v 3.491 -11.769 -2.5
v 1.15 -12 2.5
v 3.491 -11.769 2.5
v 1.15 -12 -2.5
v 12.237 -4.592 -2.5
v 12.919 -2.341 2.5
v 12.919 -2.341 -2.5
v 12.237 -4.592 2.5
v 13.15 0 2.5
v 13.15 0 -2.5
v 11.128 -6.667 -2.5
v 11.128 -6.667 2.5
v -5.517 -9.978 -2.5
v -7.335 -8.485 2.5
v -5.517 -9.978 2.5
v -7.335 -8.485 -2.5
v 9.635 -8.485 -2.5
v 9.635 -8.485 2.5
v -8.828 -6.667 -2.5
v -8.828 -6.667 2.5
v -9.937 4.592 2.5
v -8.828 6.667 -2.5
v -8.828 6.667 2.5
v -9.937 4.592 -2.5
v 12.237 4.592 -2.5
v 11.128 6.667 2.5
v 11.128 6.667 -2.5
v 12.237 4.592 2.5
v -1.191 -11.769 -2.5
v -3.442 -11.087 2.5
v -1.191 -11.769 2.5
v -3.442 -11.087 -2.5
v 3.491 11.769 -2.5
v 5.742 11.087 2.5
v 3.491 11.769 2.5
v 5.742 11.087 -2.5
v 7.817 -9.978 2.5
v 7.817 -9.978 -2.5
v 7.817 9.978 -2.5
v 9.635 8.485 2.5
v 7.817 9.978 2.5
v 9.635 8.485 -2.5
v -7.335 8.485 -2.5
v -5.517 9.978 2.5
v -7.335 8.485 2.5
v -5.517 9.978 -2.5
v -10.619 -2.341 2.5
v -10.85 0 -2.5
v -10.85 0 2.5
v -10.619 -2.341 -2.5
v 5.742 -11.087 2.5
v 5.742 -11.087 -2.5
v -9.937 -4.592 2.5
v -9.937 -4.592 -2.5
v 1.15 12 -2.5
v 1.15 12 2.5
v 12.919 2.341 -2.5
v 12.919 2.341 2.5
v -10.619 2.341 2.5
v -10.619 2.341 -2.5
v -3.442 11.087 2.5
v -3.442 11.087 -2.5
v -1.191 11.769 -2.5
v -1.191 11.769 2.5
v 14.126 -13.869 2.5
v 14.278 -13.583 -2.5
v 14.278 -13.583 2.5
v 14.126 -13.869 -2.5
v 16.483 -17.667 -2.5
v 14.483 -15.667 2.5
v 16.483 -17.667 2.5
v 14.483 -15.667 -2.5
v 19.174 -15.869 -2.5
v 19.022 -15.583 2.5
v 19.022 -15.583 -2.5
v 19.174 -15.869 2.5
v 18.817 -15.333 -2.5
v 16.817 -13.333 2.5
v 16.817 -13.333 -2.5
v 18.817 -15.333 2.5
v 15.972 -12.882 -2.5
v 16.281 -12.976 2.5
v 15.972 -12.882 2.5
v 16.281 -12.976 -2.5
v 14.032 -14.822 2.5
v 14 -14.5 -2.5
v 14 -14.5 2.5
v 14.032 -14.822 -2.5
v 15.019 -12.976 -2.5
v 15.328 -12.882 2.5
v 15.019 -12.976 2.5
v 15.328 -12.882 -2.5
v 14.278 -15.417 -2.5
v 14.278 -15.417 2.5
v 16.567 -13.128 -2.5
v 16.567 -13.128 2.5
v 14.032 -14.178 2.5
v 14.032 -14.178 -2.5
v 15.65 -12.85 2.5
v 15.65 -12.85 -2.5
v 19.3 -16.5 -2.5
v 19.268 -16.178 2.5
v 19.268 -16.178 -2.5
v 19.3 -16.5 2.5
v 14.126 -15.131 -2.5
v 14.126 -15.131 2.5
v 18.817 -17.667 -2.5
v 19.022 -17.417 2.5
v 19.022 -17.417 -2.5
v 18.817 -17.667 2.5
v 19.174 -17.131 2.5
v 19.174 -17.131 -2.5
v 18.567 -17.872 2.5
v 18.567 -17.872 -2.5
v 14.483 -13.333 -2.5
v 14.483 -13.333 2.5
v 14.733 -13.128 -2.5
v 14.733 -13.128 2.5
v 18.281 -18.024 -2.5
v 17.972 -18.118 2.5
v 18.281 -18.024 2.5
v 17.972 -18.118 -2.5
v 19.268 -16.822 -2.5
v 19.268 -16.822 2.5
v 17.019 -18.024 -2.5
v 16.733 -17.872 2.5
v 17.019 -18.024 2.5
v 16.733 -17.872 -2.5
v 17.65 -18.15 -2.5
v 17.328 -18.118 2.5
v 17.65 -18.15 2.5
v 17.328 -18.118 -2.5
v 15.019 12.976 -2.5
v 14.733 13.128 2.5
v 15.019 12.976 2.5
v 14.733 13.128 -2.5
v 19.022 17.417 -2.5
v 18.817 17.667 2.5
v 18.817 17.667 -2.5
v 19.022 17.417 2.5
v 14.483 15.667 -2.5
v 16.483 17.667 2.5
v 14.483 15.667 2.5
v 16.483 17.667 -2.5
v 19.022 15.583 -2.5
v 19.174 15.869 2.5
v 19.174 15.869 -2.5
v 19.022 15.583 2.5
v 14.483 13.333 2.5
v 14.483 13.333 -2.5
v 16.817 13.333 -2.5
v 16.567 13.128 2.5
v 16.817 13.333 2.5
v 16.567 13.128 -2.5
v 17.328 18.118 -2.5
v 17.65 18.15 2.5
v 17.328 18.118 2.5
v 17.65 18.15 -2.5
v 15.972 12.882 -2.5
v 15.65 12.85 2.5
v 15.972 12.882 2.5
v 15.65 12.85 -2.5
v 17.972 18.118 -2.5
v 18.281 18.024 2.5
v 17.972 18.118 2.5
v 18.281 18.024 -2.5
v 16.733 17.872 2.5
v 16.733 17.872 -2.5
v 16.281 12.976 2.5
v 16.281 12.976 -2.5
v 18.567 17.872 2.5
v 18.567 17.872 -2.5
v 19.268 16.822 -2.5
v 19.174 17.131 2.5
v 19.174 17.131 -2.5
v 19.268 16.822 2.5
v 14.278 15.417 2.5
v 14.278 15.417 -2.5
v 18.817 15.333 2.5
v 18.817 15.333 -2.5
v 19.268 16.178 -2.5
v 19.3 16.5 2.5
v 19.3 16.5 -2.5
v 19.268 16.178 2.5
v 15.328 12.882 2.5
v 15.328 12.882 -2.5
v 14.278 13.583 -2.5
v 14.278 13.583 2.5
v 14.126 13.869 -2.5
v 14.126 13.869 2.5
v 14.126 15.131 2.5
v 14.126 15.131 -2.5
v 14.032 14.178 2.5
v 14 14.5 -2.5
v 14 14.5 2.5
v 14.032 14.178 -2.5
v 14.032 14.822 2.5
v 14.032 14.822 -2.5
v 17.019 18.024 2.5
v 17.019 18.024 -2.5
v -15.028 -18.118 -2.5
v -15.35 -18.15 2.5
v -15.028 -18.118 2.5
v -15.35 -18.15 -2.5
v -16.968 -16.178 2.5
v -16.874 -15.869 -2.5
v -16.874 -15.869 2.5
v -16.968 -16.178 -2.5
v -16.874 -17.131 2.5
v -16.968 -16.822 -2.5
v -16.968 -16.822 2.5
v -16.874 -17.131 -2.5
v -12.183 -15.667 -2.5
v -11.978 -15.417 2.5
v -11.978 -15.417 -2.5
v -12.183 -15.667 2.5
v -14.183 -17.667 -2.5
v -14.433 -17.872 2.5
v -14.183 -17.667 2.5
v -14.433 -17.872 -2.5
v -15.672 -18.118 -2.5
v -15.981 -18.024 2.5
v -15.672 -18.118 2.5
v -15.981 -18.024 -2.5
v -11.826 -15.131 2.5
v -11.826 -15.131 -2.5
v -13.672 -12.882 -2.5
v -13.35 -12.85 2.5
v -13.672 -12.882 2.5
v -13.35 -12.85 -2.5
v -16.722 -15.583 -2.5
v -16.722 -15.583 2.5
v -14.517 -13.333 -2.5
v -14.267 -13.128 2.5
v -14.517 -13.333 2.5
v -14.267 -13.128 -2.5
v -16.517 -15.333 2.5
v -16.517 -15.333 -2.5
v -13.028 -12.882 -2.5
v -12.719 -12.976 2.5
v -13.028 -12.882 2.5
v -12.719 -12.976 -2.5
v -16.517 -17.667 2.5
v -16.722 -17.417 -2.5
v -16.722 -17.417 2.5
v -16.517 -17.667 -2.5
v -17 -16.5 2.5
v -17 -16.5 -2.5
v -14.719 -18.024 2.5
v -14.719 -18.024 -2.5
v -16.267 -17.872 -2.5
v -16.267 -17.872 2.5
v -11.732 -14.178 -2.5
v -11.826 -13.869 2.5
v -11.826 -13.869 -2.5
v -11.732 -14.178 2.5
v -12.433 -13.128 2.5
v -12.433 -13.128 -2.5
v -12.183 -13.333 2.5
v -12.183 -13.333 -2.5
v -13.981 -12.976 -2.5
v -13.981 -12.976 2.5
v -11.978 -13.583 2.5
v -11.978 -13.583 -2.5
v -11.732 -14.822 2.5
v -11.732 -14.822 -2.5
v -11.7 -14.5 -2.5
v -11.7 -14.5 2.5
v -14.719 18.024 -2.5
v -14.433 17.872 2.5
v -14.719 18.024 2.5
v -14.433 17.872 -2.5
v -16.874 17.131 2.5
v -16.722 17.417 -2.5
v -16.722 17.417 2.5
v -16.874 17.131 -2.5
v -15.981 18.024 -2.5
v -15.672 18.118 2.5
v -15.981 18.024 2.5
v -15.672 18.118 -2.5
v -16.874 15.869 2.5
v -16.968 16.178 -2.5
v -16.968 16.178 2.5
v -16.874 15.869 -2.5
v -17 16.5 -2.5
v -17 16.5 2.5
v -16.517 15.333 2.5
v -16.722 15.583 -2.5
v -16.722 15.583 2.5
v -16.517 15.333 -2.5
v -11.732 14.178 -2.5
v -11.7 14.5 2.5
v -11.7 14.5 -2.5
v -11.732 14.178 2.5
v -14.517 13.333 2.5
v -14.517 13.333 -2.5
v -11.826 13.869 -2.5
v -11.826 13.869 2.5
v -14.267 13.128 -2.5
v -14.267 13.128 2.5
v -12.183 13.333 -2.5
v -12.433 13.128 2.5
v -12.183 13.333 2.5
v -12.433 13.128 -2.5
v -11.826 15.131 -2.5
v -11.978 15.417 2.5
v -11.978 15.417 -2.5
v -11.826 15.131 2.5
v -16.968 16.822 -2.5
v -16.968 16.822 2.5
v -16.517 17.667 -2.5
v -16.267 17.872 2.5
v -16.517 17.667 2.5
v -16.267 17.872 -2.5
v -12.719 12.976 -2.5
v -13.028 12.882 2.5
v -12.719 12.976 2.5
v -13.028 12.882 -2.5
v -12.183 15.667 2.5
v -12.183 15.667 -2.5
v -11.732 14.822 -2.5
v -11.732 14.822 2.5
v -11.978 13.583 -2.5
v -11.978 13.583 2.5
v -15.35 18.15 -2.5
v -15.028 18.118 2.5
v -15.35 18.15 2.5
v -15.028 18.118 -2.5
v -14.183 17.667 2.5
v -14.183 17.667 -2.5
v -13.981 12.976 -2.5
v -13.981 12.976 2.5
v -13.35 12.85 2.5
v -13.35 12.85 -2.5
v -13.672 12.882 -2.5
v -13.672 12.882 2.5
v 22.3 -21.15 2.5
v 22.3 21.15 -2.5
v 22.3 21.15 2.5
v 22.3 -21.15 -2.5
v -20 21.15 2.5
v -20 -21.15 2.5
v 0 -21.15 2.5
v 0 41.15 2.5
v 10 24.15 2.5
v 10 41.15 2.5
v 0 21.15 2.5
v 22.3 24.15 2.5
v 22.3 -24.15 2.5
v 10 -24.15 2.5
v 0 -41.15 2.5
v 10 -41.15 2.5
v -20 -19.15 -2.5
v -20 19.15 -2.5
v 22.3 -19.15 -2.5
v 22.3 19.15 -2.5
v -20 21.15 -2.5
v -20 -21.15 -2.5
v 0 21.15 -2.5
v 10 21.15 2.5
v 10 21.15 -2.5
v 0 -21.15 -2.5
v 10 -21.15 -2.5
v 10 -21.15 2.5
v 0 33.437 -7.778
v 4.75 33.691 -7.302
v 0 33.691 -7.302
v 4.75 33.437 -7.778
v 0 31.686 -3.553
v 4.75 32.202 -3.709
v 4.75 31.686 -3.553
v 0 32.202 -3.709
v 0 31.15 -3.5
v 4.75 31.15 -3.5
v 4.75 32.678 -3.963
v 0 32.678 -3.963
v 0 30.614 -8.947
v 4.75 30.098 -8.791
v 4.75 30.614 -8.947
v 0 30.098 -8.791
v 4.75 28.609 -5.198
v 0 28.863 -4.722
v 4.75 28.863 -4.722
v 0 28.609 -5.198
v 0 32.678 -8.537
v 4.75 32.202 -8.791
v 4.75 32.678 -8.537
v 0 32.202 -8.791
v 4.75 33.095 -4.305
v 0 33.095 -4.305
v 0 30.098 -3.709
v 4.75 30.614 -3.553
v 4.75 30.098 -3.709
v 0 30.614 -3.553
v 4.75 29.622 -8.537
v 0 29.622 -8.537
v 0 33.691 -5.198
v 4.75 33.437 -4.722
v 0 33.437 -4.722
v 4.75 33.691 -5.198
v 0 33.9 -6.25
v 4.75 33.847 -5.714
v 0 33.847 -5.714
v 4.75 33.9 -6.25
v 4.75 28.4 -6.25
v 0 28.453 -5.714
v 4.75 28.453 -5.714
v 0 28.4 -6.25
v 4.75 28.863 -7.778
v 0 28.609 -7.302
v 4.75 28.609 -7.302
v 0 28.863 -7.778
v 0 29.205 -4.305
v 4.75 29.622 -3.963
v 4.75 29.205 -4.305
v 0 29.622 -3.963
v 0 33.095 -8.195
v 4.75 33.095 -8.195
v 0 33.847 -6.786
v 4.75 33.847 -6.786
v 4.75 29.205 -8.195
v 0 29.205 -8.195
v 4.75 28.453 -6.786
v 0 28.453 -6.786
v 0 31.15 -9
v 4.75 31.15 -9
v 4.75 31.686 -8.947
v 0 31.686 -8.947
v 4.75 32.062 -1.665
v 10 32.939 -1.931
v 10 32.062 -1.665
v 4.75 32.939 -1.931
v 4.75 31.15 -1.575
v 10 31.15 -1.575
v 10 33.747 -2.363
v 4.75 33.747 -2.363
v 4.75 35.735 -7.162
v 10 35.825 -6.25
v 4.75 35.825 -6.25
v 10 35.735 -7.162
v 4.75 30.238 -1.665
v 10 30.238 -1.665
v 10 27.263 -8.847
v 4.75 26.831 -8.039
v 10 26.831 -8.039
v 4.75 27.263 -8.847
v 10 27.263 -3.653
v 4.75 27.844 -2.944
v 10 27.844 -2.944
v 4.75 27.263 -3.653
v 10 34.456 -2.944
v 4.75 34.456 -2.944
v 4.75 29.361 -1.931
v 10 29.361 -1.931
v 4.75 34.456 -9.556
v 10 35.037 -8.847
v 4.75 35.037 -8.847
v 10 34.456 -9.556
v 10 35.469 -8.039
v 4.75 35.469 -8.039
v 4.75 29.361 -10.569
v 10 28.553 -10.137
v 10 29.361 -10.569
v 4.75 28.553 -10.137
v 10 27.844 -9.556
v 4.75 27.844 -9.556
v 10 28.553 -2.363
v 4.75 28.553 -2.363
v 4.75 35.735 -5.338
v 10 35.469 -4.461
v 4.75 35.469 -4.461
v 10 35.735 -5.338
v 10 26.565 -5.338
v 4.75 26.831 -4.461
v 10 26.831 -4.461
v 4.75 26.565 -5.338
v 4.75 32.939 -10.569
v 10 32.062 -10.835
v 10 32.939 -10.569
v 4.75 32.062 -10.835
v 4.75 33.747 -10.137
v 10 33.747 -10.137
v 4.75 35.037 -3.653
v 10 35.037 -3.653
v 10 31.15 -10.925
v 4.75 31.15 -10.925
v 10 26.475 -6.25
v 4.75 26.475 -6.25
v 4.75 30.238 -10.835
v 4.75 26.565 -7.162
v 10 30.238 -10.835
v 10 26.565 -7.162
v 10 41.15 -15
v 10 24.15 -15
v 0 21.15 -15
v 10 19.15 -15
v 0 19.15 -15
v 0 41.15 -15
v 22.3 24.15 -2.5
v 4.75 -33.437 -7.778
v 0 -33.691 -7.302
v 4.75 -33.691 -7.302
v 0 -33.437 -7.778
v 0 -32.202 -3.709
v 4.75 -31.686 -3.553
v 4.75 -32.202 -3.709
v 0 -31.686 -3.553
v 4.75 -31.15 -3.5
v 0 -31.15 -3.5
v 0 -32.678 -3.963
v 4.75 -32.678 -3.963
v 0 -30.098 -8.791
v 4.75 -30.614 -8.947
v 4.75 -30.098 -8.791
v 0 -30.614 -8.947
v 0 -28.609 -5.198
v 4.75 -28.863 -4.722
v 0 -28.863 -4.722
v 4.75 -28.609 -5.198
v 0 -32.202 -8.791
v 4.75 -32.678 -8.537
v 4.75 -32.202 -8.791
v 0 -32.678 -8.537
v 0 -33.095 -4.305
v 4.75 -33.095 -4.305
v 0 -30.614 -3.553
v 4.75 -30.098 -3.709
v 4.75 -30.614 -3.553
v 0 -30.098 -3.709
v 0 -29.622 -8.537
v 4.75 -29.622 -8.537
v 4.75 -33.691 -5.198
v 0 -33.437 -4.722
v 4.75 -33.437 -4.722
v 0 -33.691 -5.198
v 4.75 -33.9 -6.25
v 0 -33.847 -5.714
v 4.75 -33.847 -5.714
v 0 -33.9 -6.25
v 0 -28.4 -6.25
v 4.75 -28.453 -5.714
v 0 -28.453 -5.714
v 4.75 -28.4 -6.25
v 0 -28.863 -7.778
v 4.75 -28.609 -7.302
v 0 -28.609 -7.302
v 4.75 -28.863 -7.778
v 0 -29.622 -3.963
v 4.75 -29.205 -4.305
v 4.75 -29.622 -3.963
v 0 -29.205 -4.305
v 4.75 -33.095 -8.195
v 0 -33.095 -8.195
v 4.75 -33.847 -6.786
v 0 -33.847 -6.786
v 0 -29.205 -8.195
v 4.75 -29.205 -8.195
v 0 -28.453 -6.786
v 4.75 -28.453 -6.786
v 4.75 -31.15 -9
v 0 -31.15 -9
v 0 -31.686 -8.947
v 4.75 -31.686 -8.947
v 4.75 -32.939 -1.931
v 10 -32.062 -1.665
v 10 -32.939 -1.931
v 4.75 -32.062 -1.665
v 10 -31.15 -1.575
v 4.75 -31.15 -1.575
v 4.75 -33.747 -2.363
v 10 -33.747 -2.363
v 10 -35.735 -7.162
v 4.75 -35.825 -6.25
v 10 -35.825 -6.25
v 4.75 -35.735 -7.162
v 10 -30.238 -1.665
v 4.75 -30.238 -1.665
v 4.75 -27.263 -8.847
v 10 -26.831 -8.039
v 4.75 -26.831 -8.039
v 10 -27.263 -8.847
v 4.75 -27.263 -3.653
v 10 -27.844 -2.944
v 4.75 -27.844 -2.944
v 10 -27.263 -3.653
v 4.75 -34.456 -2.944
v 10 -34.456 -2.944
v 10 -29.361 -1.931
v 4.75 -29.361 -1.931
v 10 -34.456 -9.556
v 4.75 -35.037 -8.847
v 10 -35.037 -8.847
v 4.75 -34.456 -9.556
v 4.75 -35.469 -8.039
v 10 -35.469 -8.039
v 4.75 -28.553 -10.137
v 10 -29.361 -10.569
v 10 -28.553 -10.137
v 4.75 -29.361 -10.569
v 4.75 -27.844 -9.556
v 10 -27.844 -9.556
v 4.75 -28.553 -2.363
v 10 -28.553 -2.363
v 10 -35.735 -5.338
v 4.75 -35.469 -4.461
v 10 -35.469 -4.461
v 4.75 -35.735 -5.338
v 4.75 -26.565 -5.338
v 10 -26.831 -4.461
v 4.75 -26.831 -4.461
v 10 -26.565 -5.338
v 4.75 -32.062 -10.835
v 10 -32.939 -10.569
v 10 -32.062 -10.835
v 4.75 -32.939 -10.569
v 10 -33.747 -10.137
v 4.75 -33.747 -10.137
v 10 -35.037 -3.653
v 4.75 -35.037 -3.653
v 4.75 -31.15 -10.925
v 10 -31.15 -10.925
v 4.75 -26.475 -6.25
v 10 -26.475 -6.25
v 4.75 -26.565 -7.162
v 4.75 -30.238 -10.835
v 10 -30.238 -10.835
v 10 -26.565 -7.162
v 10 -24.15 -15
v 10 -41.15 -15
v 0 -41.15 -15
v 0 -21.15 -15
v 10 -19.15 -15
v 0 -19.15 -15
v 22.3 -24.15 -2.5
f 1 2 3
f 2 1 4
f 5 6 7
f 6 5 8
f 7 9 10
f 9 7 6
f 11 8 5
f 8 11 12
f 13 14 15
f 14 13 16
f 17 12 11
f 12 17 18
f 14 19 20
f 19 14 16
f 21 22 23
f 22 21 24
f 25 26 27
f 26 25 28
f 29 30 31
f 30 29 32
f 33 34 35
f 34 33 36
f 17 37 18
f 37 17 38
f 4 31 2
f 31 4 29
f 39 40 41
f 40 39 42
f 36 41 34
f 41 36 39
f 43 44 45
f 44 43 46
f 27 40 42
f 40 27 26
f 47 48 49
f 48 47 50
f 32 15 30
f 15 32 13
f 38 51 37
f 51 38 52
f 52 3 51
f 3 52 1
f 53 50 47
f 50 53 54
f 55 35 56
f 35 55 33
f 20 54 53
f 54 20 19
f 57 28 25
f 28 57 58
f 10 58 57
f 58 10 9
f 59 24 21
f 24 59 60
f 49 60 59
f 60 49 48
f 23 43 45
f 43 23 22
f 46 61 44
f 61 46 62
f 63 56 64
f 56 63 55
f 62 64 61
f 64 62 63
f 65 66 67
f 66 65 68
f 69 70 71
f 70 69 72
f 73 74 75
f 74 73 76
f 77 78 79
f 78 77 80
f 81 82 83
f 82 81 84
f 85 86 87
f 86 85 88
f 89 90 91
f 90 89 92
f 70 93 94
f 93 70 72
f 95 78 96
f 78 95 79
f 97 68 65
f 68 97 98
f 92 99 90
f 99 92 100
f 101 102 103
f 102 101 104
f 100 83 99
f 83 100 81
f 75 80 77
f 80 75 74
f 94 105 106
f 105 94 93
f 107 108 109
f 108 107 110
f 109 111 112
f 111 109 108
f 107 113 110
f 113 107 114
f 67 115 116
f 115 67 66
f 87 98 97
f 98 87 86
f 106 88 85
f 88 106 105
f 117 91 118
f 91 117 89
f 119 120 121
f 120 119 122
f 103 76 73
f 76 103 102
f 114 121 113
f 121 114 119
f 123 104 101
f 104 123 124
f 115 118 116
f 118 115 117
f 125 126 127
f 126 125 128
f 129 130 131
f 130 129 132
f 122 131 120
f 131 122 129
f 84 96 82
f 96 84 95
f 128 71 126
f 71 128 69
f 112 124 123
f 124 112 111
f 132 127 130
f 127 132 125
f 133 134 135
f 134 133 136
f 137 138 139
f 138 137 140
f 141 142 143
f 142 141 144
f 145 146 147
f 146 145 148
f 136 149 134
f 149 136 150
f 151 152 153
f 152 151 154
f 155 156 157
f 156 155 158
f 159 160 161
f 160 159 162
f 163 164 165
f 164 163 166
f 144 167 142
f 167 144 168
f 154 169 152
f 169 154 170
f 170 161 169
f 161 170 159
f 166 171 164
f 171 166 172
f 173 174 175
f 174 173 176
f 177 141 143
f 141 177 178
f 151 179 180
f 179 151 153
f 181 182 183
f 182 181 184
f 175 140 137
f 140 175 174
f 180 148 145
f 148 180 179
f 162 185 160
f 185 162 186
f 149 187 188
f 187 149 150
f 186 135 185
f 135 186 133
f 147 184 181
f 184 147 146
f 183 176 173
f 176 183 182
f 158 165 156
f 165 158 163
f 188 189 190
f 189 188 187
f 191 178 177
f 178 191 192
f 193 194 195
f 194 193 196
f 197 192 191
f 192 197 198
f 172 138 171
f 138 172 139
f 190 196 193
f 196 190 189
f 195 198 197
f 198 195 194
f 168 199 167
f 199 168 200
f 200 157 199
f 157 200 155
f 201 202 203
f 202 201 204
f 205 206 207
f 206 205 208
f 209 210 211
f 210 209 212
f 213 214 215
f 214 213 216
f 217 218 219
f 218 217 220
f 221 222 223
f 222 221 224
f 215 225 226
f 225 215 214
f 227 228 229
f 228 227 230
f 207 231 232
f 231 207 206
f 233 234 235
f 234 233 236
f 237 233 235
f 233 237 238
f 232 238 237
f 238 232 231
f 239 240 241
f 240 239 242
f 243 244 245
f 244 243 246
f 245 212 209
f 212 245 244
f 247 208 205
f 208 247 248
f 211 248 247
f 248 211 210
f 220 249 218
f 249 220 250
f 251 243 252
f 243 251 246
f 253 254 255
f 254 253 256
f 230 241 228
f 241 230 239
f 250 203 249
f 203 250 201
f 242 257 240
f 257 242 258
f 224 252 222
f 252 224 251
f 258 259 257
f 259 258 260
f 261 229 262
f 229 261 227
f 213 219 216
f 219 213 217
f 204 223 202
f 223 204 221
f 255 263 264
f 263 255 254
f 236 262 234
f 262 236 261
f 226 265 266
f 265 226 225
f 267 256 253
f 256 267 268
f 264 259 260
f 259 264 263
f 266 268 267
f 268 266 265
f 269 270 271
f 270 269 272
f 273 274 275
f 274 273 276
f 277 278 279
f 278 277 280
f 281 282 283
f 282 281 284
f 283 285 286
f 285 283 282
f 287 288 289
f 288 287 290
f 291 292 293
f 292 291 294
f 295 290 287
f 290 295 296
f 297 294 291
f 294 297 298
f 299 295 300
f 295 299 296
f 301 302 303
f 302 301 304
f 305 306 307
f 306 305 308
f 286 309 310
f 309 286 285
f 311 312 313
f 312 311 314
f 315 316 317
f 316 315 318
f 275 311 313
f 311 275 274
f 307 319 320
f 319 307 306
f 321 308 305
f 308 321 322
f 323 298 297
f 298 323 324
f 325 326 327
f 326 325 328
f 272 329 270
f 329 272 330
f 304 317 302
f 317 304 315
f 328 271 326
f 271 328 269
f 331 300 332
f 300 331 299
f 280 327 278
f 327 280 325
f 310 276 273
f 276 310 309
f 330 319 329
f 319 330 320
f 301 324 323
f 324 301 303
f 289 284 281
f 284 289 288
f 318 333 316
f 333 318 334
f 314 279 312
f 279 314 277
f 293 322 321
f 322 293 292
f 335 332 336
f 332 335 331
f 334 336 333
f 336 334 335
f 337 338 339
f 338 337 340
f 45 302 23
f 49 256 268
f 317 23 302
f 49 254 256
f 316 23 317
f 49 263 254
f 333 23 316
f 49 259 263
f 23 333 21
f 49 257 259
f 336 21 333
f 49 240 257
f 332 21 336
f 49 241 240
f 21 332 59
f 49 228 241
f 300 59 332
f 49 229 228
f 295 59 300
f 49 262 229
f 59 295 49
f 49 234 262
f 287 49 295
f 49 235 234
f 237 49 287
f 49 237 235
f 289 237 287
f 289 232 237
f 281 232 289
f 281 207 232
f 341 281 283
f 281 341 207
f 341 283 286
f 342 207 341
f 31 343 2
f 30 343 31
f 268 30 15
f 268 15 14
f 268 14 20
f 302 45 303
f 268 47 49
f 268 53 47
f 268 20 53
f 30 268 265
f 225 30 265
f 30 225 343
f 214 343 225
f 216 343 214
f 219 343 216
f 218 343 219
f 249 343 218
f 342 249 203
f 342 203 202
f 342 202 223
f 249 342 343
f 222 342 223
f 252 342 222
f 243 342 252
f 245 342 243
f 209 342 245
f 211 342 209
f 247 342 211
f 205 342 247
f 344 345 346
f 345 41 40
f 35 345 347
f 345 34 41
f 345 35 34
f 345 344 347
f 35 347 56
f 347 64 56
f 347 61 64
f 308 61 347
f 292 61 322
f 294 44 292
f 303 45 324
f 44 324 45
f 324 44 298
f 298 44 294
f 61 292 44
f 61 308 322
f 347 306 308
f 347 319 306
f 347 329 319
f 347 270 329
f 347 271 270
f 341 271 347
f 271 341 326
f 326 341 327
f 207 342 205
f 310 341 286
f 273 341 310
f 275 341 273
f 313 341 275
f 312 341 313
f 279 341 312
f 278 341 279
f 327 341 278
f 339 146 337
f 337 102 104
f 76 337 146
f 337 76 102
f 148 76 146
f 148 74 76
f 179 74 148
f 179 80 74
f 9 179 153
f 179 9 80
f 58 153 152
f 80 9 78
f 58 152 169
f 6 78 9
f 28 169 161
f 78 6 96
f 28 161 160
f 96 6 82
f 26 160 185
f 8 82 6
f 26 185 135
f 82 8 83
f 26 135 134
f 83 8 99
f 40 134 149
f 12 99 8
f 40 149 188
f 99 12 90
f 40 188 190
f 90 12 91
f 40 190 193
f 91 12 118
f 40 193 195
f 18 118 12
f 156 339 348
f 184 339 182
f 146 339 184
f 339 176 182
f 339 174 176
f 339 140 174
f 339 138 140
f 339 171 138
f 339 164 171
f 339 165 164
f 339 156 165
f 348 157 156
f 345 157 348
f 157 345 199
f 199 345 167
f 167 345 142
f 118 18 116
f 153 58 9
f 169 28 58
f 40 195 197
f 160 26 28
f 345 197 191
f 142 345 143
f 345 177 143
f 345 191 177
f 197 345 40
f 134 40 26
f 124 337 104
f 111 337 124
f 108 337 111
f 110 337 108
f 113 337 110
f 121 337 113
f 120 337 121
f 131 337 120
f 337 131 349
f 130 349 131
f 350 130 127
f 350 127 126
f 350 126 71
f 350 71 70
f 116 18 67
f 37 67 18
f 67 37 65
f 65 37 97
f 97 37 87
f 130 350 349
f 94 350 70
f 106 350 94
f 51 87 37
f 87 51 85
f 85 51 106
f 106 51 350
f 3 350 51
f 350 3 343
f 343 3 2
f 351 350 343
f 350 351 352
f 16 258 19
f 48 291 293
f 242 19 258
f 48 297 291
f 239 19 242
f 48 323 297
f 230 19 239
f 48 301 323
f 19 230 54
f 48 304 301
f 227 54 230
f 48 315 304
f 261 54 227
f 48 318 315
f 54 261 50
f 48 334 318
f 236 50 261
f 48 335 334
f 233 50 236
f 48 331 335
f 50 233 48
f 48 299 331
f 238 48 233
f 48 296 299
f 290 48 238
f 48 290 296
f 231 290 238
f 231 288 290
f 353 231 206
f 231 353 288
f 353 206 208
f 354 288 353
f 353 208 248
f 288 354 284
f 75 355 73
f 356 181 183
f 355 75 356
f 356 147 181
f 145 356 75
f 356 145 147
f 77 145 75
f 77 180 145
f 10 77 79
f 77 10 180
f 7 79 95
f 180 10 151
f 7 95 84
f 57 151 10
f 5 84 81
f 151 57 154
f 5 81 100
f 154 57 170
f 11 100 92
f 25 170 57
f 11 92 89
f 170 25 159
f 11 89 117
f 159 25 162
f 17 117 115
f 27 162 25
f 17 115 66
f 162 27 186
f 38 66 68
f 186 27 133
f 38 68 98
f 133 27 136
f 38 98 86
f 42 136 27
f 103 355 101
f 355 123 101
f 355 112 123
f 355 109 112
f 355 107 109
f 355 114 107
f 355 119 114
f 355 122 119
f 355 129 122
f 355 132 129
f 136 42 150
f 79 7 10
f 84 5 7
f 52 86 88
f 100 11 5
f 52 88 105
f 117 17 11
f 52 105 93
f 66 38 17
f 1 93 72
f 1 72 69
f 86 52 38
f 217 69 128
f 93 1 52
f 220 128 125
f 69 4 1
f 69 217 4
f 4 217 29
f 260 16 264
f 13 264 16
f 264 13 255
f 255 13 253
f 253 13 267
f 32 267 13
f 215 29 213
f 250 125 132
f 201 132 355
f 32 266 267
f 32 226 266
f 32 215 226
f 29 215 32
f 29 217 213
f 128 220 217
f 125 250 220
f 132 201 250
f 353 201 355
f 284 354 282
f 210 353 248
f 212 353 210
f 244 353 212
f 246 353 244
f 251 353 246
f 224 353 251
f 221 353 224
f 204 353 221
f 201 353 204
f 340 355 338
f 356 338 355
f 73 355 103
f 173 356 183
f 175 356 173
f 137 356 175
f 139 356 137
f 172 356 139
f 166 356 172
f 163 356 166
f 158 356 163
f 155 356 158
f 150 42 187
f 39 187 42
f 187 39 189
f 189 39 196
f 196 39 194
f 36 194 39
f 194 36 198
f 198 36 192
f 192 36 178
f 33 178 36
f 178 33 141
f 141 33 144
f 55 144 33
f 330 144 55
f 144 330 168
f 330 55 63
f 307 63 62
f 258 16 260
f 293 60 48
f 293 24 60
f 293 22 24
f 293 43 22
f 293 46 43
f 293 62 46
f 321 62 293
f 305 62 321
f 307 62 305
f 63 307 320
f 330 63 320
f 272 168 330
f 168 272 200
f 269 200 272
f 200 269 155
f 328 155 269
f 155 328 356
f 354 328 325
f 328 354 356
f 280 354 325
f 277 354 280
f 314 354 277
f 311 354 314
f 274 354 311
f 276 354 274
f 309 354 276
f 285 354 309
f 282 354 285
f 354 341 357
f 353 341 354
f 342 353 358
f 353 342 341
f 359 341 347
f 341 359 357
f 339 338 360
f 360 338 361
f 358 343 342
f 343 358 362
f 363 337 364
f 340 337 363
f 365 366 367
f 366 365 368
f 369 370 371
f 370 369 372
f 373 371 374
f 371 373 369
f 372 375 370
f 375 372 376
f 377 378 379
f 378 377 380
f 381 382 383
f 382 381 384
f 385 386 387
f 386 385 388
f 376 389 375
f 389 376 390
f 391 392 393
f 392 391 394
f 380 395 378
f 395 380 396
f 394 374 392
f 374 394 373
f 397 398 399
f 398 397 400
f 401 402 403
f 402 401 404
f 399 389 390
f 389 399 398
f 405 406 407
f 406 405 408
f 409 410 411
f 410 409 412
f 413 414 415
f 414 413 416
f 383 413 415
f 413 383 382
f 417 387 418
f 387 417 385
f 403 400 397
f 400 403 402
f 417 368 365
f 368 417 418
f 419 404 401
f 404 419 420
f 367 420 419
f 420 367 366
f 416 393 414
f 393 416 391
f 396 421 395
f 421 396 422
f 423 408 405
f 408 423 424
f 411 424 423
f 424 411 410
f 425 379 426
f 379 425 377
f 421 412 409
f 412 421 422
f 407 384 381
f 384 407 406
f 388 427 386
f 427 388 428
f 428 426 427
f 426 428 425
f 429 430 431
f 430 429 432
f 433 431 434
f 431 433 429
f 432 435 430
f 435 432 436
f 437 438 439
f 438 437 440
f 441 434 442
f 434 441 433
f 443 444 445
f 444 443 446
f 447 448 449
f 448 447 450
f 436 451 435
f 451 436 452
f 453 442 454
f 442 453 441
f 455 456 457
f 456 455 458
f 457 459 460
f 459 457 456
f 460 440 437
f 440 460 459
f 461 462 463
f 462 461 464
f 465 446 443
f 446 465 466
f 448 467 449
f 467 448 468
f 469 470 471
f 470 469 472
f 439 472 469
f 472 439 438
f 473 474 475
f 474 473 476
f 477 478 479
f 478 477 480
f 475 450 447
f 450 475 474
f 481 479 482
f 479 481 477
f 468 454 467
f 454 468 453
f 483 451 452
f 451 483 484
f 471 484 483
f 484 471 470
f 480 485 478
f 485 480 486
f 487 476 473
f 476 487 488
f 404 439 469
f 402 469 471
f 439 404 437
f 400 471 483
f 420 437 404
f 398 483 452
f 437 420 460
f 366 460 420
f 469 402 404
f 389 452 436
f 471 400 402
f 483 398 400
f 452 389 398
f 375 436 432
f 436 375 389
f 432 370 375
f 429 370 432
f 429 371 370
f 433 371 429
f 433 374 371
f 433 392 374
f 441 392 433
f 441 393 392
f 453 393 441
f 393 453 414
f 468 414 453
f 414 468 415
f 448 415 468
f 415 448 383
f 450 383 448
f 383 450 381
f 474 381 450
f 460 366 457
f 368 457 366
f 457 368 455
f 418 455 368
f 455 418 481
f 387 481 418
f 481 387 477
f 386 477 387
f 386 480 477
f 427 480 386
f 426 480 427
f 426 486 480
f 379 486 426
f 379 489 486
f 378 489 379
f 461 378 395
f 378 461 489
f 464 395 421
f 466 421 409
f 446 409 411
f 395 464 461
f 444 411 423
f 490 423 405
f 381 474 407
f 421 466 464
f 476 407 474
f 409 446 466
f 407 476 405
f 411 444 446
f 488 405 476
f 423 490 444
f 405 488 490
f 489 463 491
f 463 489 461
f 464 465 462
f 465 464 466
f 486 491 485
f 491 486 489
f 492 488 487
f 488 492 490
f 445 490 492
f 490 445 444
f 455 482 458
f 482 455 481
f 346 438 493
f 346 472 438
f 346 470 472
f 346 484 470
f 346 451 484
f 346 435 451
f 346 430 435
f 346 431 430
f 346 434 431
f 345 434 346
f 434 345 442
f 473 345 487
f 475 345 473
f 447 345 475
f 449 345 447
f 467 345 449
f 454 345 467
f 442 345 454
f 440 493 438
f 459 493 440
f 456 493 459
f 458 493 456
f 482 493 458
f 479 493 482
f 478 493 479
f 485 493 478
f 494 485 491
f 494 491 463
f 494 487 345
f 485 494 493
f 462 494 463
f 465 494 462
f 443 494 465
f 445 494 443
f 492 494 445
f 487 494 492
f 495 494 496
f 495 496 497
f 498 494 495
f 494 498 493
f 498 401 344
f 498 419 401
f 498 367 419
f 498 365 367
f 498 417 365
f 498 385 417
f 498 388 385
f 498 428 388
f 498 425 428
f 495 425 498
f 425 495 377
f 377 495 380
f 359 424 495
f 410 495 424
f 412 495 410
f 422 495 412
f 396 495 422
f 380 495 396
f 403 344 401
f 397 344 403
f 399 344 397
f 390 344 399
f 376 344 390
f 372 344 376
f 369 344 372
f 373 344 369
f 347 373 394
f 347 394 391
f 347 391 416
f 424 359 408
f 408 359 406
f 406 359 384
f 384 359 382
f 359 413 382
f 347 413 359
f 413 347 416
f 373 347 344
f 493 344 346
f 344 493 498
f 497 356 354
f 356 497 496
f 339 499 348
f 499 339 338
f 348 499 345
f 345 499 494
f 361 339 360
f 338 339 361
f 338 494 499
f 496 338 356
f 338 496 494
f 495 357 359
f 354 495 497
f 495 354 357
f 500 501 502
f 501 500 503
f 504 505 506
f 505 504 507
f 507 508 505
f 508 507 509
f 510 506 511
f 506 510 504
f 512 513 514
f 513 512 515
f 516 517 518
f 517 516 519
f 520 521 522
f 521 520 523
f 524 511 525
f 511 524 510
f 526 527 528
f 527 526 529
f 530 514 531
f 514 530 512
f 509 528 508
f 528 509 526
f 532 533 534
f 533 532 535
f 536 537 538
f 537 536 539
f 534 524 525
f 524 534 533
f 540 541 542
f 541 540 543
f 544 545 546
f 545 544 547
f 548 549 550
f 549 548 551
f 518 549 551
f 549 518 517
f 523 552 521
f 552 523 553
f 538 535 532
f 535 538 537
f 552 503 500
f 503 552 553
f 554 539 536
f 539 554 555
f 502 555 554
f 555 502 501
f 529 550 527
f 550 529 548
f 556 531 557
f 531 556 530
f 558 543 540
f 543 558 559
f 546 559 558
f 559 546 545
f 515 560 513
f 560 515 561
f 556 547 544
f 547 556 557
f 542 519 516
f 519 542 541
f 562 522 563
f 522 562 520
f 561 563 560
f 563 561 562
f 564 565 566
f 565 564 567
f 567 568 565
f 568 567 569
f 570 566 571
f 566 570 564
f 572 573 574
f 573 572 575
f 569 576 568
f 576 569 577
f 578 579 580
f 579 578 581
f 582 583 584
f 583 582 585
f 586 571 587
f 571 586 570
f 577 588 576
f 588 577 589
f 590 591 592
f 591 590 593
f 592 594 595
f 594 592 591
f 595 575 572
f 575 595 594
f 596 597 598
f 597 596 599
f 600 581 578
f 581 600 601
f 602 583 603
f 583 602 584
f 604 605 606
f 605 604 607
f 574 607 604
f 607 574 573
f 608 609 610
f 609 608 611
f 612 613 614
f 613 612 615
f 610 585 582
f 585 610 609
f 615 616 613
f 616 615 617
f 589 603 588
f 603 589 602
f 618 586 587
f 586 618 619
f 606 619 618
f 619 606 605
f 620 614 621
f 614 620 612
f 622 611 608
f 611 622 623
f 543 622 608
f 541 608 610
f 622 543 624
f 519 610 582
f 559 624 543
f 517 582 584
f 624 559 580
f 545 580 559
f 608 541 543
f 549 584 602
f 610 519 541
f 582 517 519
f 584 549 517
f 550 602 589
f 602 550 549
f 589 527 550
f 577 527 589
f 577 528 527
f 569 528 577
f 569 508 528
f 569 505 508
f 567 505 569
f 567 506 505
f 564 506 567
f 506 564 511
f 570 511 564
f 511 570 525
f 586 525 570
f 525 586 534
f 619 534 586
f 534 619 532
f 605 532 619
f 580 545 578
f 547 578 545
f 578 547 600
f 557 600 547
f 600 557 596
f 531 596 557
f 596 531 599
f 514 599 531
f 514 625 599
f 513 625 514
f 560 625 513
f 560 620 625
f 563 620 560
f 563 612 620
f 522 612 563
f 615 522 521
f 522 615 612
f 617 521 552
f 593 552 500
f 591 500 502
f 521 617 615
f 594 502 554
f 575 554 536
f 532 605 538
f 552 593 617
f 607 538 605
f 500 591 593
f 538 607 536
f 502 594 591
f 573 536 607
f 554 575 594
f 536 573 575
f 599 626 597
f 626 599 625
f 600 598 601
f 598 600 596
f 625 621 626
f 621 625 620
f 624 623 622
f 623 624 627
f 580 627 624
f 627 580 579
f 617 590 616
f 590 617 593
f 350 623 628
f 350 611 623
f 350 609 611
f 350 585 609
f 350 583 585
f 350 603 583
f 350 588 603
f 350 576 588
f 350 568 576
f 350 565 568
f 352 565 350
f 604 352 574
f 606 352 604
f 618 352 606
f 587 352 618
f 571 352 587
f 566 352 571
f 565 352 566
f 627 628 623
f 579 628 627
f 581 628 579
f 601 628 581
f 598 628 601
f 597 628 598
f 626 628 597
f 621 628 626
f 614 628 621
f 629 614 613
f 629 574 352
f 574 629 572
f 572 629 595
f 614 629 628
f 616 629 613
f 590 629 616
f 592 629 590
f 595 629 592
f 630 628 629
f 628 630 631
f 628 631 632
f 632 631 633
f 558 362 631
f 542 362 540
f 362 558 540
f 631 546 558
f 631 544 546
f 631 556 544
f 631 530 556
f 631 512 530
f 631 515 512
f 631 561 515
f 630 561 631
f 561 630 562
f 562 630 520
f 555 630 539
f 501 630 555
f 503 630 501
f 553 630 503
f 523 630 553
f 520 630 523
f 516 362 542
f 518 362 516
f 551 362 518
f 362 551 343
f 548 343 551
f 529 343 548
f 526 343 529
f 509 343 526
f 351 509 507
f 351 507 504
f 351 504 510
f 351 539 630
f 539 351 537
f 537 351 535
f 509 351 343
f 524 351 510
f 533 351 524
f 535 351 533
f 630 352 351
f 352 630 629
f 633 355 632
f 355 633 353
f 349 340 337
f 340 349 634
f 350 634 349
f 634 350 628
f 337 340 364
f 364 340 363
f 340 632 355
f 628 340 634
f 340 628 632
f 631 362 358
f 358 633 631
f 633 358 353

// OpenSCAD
// file: library.scad
module lm8uu (shaft_length=100) {
  d = 15.5;
  l = 24+1;
  cylinder(d=8+4, h=shaft_length, center=true);
  cylinder(d=d, h=l, center=true);
}

module lm8uu_zip_tie (thickness, width) {
  d = 15.5;
  cylinder(d=15.5+thickness*2, h=width, center=true);
  translate([0,0+(d+thickness)/2,0]) cube([100,thickness,width], center=true);
  translate([0,0-(d+thickness)/2,0]) cube([100,thickness,width], center=true);
}

module m3_mounting_hole(use_insert_nuts=false) {
  if (!use_insert_nuts) {
    translate([0, 0, 0]) rotate([90,0,0]) cylinder(d=3+0.5, h=8);
    slot_width = 5.5+0.6;
    slot_depth = 2.4+0.6;
    translate([0, -2-(slot_depth)/2, 0]) cube([slot_width,slot_depth,100], center=true);
  } else {
    translate([0, 0 + 2.5 - 5, 0]) rotate([90,0,0]) cylinder(d=4, h=5, center=true);
  }
}

function screw_head_diameter(screw_diameter) = lookup(screw_diameter, [
   [1.4, 2.6],
   [1.6, 3],
   [2.0, 3.8],
   [2.5, 4.5],
   [3.0, 5.5],
   [4.0, 7],
   [5.0, 8.5],
   [6.0, 10],
   [8.0, 13],
   [ 10, 16],
   [ 12, 18],
   [ 14, 21],
   [ 16, 24],
   [ 18, 27],
   [ 20, 30]
 ]);

// scale allows for better fit of screw in hole
// seperation avoids overhands when printing screw hole with head at bottom
module screw (d, l, head=true, scale=1.1, separation=0) { 
  half_scale = (1+(scale-1)/2);
  cylinder(h=l, d=d*scale, center=false);
  if (head) {translate([0,0,-d*half_scale]) cylinder(
    d=screw_head_diameter(d)*scale,
    h=d*scale-separation
  );}
}

module GT2_tooth(h) {
  extra_width = 0.5;
  translate([-1,-0.5-extra_width,0]) cube([2,0.5+extra_width,h]);
  linear_extrude(height=h) polygon([[0.747183,-0.5],[0.747183,0],[0.647876,0.037218],[0.598311,0.130528],[0.578556,0.238423],[0.547158,0.343077],[0.504649,0.443762],[0.451556,0.53975],[0.358229,0.636924],[0.2484,0.707276],[0.127259,0.750044],[0,0.76447],[-0.127259,0.750044],[-0.2484,0.707276],[-0.358229,0.636924],[-0.451556,0.53975],[-0.504797,0.443762],[-0.547291,0.343077],[-0.578605,0.238423],[-0.598311,0.130528],[-0.648009,0.037218],[-0.747183,0],[-0.747183,-0.5]]);
}

module stepper_motor(
  height=40,
  width=43.18,
  chamfer=4,
  screw_distance=31,
  pilot_diameter=22,
  pilot_height=2.5,
  screw_mask_height=0,
  screw_mask_slot_length=0
) {
  difference() {
    translate([0,0,-height/2]) hull() {
      cube([width, width-chamfer*2, height], center=true);
      cube([width-chamfer*2, width, height], center=true);
    }
    translate([screw_distance/2,screw_distance/2,-4.5]) cylinder(h=9,d=3);
    translate([screw_distance/2,-screw_distance/2,-4.5]) cylinder(h=9,d=3);
    translate([-screw_distance/2,screw_distance/2,-4.5]) cylinder(h=9,d=3);
    translate([-screw_distance/2,-screw_distance/2,-4.5]) cylinder(h=9,d=3);
  }
  cylinder(h=pilot_height, d=pilot_diameter);
  cylinder(h=27, d=5+2);
    
  screw_slot( screw_distance/2, screw_distance/2);
  screw_slot( screw_distance/2,-screw_distance/2);
  screw_slot(-screw_distance/2, screw_distance/2);
  screw_slot(-screw_distance/2,-screw_distance/2);
  
  module screw_slot(x, y) { hull() {
    dx = x > 0 ? screw_mask_slot_length/2 : -screw_mask_slot_length/2;
    dy = y > 0 ? screw_mask_slot_length/2 : -screw_mask_slot_length/2;
    translate([x+dx,y+dy,screw_mask_height]) rotate([180,0,0]) screw(d=3, l=screw_mask_height, d=3, head=false);
    translate([x-dx,y-dy,screw_mask_height]) rotate([180,0,0]) screw(d=3, l=screw_mask_height, d=3, head=false);
  }}
}
// main file
use <./library.scad>;

$fn = 32;
stepper_width=42.3;

difference() {
  translate([stepper_width/2-20, 0, 0]) cube([stepper_width,stepper_width,5], center=true);
  translate([stepper_width/2-20, 0, 2.51]) rotate([180,0,0]) stepper_motor(
    height=60,
    width=stepper_width,
    chamfer=4,
    screw_distance=31,
    pilot_diameter=22+2,
    pilot_height=10,
    screw_mask_height=10,
    screw_mask_slot_length=2
  );
}

translate([0,stepper_width/2,0]) mount();
translate([0,-stepper_width/2,0]) scale([1,-1,1]) mount();

module mount () {
  translate([10,0,-2.5]) cube([stepper_width-30,3,5]);
  difference() {
    translate([0,-2,-15]) cube([10,22,15+2.5]);
    translate([5,10,-(15-2.5)/2]) rotate([0, -90, 0]) screw(d=5, l=20);
  }
  translate([0,3,0]) rotate([90,0,0]) linear_extrude(height=5) polygon(points=[
    [10, -2.5],
    [10, -15],
    [stepper_width-20, -2.5]
  ]);
  rotate([90,0,0]) linear_extrude(height = 2) polygon(points = [
    [0, -2.5],
    [0, -15],
    [-20, -2.5]
  ]);
}
